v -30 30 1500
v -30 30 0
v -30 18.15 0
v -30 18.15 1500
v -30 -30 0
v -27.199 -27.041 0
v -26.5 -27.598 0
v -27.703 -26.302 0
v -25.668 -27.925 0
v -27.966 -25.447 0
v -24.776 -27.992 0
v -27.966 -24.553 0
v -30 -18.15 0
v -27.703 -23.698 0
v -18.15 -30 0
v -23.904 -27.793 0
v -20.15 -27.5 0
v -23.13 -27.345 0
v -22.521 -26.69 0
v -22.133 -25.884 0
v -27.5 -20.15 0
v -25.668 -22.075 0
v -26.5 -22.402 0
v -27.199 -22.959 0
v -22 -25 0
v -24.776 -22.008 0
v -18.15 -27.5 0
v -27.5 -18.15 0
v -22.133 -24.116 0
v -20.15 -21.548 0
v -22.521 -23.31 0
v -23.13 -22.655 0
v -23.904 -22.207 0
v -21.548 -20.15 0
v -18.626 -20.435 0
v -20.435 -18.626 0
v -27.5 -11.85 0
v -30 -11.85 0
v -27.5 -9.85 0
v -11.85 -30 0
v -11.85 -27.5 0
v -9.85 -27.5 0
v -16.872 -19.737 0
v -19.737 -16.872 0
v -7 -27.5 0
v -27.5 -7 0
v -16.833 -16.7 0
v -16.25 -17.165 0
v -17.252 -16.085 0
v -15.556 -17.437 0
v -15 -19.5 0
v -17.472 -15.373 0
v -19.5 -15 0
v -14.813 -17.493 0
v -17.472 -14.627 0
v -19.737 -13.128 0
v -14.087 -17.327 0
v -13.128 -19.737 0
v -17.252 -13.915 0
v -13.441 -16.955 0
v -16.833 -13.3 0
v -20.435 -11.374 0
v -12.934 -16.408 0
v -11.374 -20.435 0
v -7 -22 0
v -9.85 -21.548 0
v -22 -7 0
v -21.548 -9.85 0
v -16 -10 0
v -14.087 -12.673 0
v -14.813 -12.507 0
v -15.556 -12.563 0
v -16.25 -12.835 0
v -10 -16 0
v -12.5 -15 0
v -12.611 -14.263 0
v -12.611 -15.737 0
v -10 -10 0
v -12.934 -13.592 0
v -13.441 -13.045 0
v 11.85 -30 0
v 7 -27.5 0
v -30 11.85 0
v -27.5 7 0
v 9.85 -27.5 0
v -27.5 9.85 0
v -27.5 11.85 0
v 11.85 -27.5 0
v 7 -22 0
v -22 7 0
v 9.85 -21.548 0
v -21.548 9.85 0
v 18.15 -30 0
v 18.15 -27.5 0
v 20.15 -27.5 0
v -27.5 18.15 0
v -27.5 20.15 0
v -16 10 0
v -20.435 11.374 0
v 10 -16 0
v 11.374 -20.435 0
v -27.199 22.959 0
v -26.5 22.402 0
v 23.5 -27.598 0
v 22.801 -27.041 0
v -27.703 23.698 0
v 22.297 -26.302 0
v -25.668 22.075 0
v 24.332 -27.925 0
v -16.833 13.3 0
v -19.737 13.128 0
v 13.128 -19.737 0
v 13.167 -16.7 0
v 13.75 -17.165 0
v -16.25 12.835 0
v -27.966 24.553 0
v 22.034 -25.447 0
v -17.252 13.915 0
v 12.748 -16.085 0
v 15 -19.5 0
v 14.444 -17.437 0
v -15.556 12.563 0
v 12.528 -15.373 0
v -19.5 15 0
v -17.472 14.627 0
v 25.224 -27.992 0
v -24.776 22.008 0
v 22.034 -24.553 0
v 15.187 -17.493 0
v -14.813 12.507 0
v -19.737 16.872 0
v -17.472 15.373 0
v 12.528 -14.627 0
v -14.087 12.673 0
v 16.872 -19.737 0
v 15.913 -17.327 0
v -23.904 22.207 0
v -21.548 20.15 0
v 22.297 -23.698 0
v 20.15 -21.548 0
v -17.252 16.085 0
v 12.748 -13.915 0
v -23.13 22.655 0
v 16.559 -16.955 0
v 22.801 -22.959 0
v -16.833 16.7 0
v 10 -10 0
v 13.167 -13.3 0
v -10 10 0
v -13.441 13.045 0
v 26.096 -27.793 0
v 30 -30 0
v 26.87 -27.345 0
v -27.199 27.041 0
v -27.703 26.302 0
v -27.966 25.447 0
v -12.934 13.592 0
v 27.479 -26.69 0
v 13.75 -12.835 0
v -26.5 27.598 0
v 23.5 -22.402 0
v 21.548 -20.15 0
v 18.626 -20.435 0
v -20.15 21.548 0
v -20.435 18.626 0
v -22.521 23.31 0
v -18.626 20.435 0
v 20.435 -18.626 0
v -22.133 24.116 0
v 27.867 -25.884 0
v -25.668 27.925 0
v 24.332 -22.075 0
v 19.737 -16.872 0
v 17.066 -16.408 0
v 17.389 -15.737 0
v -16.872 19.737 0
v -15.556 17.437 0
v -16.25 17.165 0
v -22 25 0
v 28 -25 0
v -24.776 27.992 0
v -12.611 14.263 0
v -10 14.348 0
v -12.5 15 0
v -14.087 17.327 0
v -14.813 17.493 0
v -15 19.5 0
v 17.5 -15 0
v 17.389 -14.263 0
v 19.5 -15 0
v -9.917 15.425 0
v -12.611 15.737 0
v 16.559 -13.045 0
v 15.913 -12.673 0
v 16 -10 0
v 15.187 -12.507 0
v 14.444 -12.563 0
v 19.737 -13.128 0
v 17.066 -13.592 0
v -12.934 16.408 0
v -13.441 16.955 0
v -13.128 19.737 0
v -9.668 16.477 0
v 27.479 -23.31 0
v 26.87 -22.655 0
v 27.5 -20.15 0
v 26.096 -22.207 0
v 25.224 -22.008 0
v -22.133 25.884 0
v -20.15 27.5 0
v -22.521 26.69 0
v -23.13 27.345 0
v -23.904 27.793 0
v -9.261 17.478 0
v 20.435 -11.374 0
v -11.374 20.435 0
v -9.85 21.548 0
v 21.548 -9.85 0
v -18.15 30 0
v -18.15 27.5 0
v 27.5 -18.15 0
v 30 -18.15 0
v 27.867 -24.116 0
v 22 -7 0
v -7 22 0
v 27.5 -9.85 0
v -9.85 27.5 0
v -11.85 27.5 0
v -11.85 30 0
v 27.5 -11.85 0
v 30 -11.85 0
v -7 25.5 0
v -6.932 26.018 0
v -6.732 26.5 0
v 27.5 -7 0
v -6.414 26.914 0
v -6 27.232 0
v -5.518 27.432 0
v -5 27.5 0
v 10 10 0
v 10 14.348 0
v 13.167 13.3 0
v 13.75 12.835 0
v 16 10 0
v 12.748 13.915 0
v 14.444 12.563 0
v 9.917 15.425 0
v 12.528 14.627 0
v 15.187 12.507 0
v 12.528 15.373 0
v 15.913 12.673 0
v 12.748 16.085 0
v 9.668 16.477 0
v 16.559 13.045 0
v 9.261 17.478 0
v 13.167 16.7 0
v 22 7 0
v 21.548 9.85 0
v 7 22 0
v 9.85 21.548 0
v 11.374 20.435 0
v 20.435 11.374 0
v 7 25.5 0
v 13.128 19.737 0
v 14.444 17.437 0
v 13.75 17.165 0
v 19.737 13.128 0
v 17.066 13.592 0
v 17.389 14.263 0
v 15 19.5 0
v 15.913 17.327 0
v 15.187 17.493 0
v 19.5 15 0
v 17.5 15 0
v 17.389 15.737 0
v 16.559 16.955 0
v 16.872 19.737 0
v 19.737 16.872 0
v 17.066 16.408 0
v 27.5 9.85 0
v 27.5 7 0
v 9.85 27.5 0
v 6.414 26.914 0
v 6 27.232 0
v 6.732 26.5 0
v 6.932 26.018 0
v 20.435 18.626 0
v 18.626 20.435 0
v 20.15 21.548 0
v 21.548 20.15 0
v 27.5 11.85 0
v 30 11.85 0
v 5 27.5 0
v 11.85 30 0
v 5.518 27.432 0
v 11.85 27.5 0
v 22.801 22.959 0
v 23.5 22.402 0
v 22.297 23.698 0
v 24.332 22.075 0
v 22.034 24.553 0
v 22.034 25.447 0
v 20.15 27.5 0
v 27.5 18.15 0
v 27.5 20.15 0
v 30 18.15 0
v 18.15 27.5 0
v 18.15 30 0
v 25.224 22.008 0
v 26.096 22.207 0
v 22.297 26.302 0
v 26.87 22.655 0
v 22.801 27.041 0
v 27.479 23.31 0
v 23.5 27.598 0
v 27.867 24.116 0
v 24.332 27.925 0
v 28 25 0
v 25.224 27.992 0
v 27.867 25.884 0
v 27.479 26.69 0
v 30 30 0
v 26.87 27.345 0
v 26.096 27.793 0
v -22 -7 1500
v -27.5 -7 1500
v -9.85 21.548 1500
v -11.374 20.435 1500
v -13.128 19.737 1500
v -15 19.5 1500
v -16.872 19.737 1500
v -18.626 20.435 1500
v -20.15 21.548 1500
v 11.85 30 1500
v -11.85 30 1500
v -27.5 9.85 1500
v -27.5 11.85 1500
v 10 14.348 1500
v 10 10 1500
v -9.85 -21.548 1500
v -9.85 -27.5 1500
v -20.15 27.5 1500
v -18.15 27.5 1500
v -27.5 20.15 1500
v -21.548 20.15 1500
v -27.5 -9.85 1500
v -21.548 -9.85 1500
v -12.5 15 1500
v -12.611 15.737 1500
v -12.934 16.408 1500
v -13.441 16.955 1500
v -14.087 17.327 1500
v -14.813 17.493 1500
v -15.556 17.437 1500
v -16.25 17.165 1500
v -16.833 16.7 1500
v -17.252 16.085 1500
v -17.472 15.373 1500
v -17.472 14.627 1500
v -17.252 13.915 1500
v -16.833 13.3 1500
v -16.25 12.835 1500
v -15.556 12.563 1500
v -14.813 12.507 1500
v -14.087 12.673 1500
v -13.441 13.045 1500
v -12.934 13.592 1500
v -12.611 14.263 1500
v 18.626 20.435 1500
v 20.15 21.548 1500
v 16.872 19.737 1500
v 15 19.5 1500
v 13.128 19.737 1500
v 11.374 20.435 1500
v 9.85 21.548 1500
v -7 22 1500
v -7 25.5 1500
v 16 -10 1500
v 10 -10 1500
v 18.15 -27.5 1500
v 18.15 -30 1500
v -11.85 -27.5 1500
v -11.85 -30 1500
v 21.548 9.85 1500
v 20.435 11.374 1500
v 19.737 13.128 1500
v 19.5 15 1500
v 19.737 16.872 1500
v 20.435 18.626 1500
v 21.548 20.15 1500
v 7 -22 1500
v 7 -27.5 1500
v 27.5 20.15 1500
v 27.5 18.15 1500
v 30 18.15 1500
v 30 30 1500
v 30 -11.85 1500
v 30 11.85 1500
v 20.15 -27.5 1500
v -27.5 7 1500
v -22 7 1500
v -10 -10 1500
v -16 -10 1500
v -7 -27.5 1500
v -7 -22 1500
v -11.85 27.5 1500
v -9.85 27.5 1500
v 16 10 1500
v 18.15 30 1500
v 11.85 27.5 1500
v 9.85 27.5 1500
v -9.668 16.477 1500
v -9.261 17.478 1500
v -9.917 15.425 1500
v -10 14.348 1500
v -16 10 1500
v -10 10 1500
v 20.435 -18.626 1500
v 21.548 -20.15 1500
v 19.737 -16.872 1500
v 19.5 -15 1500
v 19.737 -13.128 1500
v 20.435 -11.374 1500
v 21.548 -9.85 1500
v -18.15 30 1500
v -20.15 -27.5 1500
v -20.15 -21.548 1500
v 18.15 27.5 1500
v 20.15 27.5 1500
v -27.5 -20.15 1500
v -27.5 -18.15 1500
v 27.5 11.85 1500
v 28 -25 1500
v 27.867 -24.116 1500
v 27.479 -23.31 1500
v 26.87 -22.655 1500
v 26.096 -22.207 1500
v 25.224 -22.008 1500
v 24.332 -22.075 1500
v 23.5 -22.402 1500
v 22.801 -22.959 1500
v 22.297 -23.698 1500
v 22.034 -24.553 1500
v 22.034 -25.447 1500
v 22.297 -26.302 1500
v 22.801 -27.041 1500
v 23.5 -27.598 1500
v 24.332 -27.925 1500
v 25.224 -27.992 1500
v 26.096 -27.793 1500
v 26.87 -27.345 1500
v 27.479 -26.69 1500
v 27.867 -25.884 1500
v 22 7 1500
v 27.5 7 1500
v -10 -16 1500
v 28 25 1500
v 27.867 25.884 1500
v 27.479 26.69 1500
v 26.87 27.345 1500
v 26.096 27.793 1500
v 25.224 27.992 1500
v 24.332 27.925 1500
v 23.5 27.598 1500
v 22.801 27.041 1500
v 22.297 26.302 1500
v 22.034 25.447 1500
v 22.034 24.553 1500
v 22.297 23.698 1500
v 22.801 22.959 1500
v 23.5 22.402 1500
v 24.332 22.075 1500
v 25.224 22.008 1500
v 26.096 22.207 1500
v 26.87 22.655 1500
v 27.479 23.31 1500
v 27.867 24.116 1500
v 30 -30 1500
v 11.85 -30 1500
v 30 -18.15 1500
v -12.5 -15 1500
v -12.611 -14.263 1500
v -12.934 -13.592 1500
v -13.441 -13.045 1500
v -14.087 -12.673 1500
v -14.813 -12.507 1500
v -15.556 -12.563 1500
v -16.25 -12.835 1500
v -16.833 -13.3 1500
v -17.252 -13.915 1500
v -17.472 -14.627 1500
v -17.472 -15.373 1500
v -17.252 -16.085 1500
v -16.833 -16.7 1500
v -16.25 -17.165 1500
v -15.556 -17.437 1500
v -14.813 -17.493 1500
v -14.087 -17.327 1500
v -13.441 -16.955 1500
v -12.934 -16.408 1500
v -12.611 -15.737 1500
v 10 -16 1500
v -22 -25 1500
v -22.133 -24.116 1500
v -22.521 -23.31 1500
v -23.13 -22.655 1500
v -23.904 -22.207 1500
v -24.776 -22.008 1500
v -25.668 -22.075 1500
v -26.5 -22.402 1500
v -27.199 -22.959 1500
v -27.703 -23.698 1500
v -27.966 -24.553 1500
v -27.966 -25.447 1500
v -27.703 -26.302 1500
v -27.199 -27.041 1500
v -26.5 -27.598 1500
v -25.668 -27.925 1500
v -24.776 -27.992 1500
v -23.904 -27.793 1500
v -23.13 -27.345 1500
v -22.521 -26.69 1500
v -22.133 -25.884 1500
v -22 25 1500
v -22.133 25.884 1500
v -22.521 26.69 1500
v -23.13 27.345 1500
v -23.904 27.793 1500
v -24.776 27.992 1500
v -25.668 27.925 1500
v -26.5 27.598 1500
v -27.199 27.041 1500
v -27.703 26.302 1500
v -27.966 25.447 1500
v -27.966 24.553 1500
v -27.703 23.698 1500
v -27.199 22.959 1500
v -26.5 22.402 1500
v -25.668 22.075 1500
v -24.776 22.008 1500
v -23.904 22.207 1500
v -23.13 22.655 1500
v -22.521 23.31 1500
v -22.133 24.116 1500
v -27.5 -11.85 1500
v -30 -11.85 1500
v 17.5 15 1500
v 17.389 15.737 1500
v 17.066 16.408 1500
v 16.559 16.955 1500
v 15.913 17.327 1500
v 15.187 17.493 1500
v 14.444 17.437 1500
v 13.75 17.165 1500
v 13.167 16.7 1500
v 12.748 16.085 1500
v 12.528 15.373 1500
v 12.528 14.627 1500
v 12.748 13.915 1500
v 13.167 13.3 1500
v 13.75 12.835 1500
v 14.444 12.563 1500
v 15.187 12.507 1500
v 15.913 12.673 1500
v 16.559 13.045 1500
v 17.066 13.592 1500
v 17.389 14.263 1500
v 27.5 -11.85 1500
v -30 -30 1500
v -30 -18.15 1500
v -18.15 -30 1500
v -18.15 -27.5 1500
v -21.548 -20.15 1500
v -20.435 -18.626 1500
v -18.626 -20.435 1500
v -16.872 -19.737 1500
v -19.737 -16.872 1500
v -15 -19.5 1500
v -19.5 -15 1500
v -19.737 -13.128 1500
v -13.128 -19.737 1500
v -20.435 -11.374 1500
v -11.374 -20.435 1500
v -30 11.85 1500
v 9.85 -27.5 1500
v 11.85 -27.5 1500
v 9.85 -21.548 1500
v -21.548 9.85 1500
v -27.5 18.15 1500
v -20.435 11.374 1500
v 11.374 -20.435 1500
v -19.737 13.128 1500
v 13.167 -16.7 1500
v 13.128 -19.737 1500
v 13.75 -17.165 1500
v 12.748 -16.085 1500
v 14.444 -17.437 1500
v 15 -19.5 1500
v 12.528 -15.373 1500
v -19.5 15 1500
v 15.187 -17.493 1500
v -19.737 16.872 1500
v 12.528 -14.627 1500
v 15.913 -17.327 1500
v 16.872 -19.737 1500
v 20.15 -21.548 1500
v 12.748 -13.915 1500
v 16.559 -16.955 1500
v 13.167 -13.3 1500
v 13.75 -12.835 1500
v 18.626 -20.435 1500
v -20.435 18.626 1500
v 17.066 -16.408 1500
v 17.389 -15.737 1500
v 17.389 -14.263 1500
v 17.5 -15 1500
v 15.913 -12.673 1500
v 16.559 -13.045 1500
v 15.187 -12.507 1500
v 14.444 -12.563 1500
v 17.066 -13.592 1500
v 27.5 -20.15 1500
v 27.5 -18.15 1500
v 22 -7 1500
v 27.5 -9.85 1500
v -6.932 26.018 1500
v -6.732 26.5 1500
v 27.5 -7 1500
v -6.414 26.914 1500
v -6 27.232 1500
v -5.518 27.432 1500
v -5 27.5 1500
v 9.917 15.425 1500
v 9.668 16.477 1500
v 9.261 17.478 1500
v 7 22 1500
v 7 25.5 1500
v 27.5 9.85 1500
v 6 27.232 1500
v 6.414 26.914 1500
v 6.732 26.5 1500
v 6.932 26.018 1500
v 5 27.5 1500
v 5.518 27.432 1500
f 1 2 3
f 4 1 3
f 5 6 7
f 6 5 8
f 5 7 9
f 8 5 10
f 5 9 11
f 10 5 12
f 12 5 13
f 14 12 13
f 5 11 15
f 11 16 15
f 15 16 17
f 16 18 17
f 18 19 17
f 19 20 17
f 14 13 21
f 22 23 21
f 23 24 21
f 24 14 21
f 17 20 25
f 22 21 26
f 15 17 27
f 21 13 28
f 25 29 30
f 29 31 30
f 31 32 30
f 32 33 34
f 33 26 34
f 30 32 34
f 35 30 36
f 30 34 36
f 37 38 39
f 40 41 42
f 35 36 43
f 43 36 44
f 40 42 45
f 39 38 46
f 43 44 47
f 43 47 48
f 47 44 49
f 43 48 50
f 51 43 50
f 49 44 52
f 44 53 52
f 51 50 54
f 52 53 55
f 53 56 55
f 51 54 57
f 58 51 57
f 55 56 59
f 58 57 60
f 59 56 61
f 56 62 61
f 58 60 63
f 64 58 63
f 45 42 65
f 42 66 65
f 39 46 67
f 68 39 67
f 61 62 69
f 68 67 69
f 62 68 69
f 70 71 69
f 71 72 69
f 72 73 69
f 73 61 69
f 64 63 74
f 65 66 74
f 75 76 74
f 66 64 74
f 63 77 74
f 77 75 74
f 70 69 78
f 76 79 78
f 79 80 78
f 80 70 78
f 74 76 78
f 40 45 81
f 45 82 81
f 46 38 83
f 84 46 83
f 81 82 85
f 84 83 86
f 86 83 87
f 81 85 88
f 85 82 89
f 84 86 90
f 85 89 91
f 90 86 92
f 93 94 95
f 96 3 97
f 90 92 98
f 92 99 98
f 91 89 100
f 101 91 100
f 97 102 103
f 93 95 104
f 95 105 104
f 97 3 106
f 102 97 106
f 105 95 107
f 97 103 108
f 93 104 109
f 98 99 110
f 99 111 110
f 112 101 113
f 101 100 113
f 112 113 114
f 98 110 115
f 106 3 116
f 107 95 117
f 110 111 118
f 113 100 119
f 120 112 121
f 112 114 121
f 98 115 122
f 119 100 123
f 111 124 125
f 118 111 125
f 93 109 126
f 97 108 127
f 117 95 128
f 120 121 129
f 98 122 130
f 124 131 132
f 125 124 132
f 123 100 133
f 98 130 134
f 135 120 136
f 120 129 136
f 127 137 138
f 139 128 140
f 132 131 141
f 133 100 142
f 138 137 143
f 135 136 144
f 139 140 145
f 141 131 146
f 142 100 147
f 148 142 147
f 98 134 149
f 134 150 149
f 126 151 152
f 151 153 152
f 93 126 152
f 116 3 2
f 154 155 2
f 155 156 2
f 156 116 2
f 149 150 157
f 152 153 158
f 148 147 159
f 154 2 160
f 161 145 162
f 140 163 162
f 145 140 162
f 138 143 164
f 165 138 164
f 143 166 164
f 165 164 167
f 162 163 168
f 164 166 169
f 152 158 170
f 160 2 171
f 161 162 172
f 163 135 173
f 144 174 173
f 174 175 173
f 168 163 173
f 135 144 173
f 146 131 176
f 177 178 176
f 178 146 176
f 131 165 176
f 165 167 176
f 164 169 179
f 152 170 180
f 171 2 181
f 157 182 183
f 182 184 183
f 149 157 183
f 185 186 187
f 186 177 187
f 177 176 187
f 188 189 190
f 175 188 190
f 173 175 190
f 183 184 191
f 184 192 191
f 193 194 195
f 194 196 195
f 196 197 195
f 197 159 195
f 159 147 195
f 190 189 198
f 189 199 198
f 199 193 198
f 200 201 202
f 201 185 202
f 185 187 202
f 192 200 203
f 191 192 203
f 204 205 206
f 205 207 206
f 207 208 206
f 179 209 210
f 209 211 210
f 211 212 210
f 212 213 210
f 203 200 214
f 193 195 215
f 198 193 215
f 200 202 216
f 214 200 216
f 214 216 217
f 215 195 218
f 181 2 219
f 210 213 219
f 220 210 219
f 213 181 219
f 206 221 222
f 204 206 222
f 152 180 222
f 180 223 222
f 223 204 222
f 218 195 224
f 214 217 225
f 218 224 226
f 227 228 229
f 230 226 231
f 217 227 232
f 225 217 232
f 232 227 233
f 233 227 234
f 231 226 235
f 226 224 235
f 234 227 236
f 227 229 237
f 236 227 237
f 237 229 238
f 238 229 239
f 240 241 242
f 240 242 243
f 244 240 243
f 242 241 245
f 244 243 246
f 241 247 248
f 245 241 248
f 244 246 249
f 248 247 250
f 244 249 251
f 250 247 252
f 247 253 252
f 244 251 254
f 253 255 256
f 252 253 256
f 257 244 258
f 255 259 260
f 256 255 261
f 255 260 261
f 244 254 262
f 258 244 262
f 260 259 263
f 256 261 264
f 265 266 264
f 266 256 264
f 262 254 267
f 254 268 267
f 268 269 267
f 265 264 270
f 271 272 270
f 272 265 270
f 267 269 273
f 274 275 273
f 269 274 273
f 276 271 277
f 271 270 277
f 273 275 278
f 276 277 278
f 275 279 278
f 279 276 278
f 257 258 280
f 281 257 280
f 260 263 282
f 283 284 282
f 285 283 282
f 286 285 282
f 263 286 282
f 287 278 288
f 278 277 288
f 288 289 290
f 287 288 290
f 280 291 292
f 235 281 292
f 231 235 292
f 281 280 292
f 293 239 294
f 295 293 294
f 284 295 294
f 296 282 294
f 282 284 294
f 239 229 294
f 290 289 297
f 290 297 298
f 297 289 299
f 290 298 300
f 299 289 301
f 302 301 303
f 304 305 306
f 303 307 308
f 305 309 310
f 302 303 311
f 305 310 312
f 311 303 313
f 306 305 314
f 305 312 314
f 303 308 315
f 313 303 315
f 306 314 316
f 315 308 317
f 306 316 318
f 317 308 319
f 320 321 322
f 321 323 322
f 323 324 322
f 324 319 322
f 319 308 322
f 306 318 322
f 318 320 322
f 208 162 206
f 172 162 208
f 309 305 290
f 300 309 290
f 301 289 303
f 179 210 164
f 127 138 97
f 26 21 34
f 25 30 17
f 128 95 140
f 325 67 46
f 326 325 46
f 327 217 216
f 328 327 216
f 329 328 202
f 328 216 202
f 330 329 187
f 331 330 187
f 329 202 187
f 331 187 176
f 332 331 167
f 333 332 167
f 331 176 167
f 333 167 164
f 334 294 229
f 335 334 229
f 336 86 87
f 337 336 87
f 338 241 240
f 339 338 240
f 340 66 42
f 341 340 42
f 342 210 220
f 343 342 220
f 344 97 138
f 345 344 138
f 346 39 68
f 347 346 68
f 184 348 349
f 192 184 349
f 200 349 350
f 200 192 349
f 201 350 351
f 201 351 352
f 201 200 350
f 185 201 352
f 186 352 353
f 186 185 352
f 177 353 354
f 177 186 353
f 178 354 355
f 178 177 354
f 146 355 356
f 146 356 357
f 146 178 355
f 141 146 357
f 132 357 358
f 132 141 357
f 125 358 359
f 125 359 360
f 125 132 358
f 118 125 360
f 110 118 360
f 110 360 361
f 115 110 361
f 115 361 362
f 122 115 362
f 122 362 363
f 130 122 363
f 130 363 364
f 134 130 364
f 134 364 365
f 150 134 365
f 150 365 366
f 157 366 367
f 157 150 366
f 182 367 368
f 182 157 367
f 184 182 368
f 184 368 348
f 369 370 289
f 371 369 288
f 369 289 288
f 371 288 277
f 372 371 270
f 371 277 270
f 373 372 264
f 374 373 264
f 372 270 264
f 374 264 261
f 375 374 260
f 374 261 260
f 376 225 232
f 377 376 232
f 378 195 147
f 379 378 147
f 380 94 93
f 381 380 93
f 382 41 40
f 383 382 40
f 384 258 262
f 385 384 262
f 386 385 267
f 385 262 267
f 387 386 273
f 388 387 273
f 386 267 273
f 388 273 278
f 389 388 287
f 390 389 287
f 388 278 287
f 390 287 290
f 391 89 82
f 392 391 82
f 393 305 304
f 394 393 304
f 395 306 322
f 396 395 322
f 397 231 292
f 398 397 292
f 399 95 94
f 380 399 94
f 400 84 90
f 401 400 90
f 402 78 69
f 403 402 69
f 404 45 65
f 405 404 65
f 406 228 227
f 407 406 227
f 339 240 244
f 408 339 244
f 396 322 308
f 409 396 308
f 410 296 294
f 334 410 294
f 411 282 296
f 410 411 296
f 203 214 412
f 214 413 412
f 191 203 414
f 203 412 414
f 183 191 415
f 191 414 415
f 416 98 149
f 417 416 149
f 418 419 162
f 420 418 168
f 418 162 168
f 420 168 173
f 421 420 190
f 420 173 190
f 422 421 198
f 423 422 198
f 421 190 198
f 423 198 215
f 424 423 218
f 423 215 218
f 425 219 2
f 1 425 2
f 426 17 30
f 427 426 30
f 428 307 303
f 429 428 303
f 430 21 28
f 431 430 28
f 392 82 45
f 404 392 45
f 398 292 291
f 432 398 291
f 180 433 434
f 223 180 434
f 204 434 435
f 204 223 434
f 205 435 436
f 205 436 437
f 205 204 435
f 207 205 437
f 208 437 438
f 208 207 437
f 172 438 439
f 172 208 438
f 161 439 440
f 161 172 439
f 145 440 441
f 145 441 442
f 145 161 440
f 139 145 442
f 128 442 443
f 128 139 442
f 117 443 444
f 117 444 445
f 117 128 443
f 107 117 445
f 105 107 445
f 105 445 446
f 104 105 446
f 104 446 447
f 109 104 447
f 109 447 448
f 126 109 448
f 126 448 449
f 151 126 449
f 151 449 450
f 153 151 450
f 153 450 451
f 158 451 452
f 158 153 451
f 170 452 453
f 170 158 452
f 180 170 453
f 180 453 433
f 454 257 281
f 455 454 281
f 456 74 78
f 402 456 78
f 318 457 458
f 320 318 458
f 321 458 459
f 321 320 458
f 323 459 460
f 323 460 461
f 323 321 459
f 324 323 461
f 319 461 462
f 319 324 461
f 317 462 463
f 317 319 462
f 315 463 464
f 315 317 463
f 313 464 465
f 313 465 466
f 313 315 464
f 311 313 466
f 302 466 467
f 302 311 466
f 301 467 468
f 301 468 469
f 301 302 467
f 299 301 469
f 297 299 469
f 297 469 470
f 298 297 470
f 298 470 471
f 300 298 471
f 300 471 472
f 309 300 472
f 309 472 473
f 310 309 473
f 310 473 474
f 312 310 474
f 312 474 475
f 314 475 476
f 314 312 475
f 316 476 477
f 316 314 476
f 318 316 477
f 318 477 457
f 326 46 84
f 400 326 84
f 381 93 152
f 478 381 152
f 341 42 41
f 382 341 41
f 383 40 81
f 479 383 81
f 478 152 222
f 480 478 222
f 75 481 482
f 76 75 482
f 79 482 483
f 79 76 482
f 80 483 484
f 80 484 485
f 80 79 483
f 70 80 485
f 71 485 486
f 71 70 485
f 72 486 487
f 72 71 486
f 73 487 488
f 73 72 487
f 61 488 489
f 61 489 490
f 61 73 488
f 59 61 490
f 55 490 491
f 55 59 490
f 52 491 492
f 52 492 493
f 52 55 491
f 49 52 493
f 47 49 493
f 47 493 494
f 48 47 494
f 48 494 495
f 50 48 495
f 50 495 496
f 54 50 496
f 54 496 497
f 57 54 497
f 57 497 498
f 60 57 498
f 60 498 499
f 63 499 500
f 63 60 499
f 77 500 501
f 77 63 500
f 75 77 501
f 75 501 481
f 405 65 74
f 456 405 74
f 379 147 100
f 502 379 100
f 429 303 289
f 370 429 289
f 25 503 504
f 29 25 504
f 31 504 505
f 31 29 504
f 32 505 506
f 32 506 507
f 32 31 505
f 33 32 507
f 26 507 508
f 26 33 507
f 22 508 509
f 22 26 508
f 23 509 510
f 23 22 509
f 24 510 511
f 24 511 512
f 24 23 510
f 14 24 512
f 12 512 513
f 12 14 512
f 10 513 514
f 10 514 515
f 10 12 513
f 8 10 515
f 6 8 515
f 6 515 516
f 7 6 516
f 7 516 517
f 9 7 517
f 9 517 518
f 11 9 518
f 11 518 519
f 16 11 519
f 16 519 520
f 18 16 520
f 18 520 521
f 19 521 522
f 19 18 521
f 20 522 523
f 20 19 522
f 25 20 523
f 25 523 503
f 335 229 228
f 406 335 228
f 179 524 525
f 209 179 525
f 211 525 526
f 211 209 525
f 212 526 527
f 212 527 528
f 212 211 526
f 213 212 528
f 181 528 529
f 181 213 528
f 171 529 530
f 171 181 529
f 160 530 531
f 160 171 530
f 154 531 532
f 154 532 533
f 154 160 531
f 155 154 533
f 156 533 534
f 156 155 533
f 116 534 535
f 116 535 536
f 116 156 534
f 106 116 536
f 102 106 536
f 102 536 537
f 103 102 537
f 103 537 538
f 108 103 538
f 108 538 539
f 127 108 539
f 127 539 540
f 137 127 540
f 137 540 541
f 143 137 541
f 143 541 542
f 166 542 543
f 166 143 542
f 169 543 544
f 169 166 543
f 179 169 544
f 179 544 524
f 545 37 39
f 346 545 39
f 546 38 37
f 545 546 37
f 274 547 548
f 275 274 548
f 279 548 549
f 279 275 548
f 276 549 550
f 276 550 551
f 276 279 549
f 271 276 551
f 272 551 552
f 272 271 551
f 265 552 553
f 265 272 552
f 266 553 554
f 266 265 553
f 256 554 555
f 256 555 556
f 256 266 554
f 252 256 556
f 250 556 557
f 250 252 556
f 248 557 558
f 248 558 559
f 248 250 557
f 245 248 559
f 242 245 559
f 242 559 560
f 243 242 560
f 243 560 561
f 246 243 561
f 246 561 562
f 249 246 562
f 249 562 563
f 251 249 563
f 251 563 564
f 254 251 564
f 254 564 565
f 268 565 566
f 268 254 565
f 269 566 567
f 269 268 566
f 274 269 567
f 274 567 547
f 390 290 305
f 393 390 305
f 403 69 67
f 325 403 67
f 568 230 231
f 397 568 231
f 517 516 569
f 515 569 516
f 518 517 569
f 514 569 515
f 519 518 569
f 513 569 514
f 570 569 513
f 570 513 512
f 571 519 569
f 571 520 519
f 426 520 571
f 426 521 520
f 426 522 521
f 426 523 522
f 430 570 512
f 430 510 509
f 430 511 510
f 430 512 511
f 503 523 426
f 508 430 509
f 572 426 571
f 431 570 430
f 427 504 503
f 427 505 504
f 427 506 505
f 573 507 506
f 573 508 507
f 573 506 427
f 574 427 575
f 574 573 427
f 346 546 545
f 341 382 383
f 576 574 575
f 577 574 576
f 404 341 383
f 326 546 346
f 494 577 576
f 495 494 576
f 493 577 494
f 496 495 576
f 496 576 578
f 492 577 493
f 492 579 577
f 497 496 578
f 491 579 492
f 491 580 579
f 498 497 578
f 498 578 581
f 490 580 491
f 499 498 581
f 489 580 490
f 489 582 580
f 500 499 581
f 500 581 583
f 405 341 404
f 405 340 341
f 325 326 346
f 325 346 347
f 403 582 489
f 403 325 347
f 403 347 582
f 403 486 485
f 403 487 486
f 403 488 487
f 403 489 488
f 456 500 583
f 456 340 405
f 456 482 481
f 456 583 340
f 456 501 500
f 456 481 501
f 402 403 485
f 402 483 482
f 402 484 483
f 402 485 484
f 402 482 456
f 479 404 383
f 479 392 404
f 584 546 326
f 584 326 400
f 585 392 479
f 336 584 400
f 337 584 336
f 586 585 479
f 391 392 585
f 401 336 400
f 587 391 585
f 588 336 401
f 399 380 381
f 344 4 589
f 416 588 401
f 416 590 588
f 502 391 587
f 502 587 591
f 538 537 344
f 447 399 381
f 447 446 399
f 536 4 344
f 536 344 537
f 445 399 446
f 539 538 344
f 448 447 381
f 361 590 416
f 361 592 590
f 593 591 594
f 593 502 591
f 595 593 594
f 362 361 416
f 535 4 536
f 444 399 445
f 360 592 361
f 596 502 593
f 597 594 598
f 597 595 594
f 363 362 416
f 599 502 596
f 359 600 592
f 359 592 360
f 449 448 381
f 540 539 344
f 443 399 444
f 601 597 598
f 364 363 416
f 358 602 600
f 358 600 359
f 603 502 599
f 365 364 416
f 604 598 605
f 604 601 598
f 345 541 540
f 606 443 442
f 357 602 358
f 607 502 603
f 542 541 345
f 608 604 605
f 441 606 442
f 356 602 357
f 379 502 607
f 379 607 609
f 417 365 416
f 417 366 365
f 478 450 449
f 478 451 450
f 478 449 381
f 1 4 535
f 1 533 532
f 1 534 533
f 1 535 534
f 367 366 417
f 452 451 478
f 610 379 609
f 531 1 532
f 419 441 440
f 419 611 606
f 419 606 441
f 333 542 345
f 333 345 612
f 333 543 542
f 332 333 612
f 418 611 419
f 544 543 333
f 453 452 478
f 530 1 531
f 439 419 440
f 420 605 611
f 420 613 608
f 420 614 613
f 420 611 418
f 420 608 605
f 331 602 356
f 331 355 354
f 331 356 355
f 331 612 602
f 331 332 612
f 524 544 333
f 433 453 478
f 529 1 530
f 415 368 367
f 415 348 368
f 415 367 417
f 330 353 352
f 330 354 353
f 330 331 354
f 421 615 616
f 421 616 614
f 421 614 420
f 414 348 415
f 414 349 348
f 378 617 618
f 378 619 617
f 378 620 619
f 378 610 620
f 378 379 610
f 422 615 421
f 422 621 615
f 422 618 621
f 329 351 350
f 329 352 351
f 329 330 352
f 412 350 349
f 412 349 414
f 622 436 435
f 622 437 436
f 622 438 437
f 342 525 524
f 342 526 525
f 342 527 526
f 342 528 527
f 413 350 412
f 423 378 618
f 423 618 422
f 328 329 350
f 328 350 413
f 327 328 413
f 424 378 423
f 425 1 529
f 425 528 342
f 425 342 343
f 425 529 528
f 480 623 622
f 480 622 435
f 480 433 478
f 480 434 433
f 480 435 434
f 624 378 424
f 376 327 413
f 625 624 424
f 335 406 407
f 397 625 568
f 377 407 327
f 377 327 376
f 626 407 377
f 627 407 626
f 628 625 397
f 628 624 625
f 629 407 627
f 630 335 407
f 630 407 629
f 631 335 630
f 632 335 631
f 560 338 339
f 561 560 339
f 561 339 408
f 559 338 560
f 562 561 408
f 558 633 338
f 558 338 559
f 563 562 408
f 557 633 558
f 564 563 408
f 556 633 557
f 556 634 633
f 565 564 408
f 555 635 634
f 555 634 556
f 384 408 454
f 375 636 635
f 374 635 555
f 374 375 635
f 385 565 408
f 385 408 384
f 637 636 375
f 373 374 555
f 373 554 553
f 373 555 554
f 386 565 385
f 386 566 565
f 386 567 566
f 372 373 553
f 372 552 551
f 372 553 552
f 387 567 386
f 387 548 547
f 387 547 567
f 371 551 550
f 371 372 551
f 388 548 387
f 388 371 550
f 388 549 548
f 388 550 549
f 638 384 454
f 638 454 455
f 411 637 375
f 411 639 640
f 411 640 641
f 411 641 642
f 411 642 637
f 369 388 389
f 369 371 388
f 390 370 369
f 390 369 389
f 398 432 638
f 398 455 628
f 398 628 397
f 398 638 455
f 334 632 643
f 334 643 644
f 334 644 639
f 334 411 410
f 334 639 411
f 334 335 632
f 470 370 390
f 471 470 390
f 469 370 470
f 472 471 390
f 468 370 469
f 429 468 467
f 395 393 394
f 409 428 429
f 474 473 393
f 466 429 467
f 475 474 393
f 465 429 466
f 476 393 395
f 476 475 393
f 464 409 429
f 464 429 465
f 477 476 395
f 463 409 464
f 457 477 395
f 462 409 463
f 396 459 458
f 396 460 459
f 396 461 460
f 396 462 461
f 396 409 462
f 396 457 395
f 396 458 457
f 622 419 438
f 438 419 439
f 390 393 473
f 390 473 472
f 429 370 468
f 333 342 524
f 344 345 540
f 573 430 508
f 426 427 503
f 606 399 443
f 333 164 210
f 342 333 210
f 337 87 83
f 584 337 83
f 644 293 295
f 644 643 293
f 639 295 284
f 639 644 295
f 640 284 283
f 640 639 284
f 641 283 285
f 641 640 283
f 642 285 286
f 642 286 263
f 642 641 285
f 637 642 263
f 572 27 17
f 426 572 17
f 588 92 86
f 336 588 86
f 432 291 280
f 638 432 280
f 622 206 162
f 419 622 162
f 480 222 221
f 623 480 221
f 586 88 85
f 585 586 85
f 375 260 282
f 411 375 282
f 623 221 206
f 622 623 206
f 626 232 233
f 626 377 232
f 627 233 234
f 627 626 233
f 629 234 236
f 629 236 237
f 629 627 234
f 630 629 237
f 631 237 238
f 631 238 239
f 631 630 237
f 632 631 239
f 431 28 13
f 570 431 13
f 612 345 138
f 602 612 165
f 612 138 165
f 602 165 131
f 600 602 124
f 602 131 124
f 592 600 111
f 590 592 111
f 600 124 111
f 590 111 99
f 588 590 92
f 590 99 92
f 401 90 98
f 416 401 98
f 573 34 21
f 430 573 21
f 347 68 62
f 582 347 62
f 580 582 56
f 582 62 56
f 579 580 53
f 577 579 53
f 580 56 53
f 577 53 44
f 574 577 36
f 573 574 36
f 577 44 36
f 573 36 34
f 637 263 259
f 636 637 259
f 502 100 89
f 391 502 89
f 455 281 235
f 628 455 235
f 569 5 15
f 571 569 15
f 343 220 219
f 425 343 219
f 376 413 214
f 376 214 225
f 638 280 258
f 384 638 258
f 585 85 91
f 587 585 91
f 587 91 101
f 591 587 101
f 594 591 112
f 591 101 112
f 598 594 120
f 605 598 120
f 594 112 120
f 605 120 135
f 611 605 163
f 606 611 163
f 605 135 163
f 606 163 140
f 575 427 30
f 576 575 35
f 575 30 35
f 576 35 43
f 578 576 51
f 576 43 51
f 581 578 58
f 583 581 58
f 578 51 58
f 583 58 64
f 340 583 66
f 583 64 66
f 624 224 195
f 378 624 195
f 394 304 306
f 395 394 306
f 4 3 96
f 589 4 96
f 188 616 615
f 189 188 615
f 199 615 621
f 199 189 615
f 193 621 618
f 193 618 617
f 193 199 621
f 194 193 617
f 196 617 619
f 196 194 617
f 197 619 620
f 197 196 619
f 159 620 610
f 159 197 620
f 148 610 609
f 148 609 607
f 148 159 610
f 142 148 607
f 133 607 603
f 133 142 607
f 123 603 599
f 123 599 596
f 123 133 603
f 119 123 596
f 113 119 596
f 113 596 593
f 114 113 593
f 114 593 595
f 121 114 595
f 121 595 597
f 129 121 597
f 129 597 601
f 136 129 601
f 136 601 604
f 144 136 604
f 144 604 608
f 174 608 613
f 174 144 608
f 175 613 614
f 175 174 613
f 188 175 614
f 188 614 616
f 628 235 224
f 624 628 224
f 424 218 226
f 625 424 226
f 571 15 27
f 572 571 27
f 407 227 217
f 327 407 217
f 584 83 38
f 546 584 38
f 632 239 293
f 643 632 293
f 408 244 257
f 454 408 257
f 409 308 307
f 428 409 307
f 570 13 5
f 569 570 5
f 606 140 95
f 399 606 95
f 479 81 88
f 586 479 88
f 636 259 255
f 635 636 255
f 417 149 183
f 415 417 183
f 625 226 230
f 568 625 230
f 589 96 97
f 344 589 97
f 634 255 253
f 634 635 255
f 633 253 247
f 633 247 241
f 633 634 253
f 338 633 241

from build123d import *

# Parameters (mm, degrees)
F0_R     = 3
F0_R_2   = 2.5
F1_DEPTH = 1500
F2_R     = 2
F3_R     = 7


# Not quite as in the source:
# - a feature names something its author has since deleted; it is built from what else it names


with BuildPart() as f1:
    # F0 (on Top) → F1 (new body)
    with BuildSketch(Plane.XY):
        with BuildLine():
            Line((18.15, -30), (30, -30))
            Line((30, -30), (30, -18.15))
            Line((30, -18.15), (27.5, -18.15))
            Line((27.5, -18.15), (27.5, -20.15))
            Line((27.5, -20.15), (21.5477069044, -20.15))
            ThreePointArc((21.5477069044, -20.15), (19.5, -15), (21.5477069044, -9.85))
            Line((21.5477069044, -9.85), (27.5, -9.85))
            Line((27.5, -9.85), (27.5, -11.85))
            Line((27.5, -11.85), (30, -11.85))
            Line((30, -11.85), (30, 11.85))
            Line((30, 11.85), (27.5, 11.85))
            Line((27.5, 11.85), (27.5, 9.85))
            Line((27.5, 9.85), (21.5477069044, 9.85))
            ThreePointArc((21.5477069044, 9.85), (19.5, 15), (21.5477069044, 20.15))
            Line((21.5477069044, 20.15), (27.5, 20.15))
            Line((27.5, 20.15), (27.5, 18.15))
            Line((27.5, 18.15), (30, 18.15))
            Line((30, 18.15), (30, 30))
            Line((30, 30), (18.15, 30))
            Line((18.15, 30), (18.15, 27.5))
            Line((18.15, 27.5), (20.15, 27.5))
            Line((20.15, 27.5), (20.15, 21.5477069044))
            ThreePointArc((20.15, 21.5477069044), (15, 19.5), (9.85, 21.5477069044))
            Line((9.85, 21.5477069044), (9.85, 27.5))
            Line((9.85, 27.5), (11.85, 27.5))
            Line((11.85, 27.5), (11.85, 30))
            Line((11.85, 30), (-11.85, 30))
            Line((-11.85, 30), (-11.85, 27.5))
            Line((-11.85, 27.5), (-9.85, 27.5))
            Line((-9.85, 27.5), (-9.85, 21.5477069044))
            ThreePointArc((-9.85, 21.5477069044), (-15, 19.5), (-20.15, 21.5477069044))
            Line((-20.15, 21.5477069044), (-20.15, 27.5))
            Line((-20.15, 27.5), (-18.15, 27.5))
            Line((-18.15, 27.5), (-18.15, 30))
            Line((-18.15, 30), (-30, 30))
            Line((-30, 30), (-30, 18.15))
            Line((-30, 18.15), (-27.5, 18.15))
            Line((-27.5, 18.15), (-27.5, 20.15))
            Line((-27.5, 20.15), (-21.5477069044, 20.15))
            ThreePointArc((-21.5477069044, 20.15), (-19.5, 15), (-21.5477069044, 9.85))
            Line((-21.5477069044, 9.85), (-27.5, 9.85))
            Line((-27.5, 9.85), (-27.5, 11.85))
            Line((-27.5, 11.85), (-30, 11.85))
            Line((-30, 11.85), (-30, -11.85))
            Line((-30, -11.85), (-27.5, -11.85))
            Line((-27.5, -11.85), (-27.5, -9.85))
            Line((-27.5, -9.85), (-21.5477069044, -9.85))
            ThreePointArc((-21.5477069044, -9.85), (-19.5, -15), (-21.5477069044, -20.15))
            Line((-21.5477069044, -20.15), (-27.5, -20.15))
            Line((-27.5, -20.15), (-27.5, -18.15))
            Line((-27.5, -18.15), (-30, -18.15))
            Line((-30, -18.15), (-30, -30))
            Line((-30, -30), (-18.15, -30))
            Line((-18.15, -30), (-18.15, -27.5))
            Line((-18.15, -27.5), (-20.15, -27.5))
            Line((-20.15, -27.5), (-20.15, -21.5477069044))
            ThreePointArc((-20.15, -21.5477069044), (-15, -19.5), (-9.85, -21.5477069044))
            Line((-9.85, -21.5477069044), (-9.85, -27.5))
            Line((-9.85, -27.5), (-11.85, -27.5))
            Line((-11.85, -27.5), (-11.85, -30))
            Line((-11.85, -30), (11.85, -30))
            Line((11.85, -30), (11.85, -27.5))
            Line((11.85, -27.5), (9.85, -27.5))
            Line((9.85, -27.5), (9.85, -21.5477069044))
            ThreePointArc((9.85, -21.5477069044), (15, -19.5), (20.15, -21.5477069044))
            Line((20.15, -21.5477069044), (20.15, -27.5))
            Line((20.15, -27.5), (18.15, -27.5))
            Line((18.15, -27.5), (18.15, -30))
        make_face()
        with Locations((-25, -25)):
            Circle(F0_R, mode=Mode.SUBTRACT)
        with Locations((-15, -15)):
            Circle(F0_R_2, mode=Mode.SUBTRACT)
        with Locations((25, -25)):
            Circle(F0_R, mode=Mode.SUBTRACT)
        with Locations((15, -15)):
            Circle(F0_R_2, mode=Mode.SUBTRACT)
        with Locations((-25, 25)):
            Circle(F0_R, mode=Mode.SUBTRACT)
        with Locations((-15, 15)):
            Circle(F0_R_2, mode=Mode.SUBTRACT)
        Polygon((-7, 22), (-7, 27.5), (0, 27.5), (7, 27.5), (7, 22), (10, 16), (10, 10), (16, 10), (22, 7), (27.5, 7), (27.5, 0), (27.5, -7), (22, -7), (16, -10), (10, -10), (10, -16), (7, -22), (7, -27.5), (0, -27.5), (-7, -27.5), (-7, -22), (-10, -16), (-10, -10), (-16, -10), (-22, -7), (-27.5, -7), (-27.5, 0), (-27.5, 7), (-22, 7), (-16, 10), (-10, 10), (-10, 16), align=None, mode=Mode.SUBTRACT)
        with Locations((15, 15)):
            Circle(F0_R_2, mode=Mode.SUBTRACT)
        with Locations((25, 25)):
            Circle(F0_R, mode=Mode.SUBTRACT)
    extrude(amount=F1_DEPTH)

    # F2
    f2_edges = [f1.edges().sort_by_distance(p)[0] for p in [
        (-7, 27.5, 750),
        (7, 27.5, 750),
    ]]
    fillet(f2_edges, radius=F2_R)

    # F3
    f3_edges = [f1.edges().sort_by_distance(p)[0] for p in [
        (-10, 16, 750),
        (10, 16, 750),
    ]]
    fillet(f3_edges, radius=F3_R)


solid = f1.part
